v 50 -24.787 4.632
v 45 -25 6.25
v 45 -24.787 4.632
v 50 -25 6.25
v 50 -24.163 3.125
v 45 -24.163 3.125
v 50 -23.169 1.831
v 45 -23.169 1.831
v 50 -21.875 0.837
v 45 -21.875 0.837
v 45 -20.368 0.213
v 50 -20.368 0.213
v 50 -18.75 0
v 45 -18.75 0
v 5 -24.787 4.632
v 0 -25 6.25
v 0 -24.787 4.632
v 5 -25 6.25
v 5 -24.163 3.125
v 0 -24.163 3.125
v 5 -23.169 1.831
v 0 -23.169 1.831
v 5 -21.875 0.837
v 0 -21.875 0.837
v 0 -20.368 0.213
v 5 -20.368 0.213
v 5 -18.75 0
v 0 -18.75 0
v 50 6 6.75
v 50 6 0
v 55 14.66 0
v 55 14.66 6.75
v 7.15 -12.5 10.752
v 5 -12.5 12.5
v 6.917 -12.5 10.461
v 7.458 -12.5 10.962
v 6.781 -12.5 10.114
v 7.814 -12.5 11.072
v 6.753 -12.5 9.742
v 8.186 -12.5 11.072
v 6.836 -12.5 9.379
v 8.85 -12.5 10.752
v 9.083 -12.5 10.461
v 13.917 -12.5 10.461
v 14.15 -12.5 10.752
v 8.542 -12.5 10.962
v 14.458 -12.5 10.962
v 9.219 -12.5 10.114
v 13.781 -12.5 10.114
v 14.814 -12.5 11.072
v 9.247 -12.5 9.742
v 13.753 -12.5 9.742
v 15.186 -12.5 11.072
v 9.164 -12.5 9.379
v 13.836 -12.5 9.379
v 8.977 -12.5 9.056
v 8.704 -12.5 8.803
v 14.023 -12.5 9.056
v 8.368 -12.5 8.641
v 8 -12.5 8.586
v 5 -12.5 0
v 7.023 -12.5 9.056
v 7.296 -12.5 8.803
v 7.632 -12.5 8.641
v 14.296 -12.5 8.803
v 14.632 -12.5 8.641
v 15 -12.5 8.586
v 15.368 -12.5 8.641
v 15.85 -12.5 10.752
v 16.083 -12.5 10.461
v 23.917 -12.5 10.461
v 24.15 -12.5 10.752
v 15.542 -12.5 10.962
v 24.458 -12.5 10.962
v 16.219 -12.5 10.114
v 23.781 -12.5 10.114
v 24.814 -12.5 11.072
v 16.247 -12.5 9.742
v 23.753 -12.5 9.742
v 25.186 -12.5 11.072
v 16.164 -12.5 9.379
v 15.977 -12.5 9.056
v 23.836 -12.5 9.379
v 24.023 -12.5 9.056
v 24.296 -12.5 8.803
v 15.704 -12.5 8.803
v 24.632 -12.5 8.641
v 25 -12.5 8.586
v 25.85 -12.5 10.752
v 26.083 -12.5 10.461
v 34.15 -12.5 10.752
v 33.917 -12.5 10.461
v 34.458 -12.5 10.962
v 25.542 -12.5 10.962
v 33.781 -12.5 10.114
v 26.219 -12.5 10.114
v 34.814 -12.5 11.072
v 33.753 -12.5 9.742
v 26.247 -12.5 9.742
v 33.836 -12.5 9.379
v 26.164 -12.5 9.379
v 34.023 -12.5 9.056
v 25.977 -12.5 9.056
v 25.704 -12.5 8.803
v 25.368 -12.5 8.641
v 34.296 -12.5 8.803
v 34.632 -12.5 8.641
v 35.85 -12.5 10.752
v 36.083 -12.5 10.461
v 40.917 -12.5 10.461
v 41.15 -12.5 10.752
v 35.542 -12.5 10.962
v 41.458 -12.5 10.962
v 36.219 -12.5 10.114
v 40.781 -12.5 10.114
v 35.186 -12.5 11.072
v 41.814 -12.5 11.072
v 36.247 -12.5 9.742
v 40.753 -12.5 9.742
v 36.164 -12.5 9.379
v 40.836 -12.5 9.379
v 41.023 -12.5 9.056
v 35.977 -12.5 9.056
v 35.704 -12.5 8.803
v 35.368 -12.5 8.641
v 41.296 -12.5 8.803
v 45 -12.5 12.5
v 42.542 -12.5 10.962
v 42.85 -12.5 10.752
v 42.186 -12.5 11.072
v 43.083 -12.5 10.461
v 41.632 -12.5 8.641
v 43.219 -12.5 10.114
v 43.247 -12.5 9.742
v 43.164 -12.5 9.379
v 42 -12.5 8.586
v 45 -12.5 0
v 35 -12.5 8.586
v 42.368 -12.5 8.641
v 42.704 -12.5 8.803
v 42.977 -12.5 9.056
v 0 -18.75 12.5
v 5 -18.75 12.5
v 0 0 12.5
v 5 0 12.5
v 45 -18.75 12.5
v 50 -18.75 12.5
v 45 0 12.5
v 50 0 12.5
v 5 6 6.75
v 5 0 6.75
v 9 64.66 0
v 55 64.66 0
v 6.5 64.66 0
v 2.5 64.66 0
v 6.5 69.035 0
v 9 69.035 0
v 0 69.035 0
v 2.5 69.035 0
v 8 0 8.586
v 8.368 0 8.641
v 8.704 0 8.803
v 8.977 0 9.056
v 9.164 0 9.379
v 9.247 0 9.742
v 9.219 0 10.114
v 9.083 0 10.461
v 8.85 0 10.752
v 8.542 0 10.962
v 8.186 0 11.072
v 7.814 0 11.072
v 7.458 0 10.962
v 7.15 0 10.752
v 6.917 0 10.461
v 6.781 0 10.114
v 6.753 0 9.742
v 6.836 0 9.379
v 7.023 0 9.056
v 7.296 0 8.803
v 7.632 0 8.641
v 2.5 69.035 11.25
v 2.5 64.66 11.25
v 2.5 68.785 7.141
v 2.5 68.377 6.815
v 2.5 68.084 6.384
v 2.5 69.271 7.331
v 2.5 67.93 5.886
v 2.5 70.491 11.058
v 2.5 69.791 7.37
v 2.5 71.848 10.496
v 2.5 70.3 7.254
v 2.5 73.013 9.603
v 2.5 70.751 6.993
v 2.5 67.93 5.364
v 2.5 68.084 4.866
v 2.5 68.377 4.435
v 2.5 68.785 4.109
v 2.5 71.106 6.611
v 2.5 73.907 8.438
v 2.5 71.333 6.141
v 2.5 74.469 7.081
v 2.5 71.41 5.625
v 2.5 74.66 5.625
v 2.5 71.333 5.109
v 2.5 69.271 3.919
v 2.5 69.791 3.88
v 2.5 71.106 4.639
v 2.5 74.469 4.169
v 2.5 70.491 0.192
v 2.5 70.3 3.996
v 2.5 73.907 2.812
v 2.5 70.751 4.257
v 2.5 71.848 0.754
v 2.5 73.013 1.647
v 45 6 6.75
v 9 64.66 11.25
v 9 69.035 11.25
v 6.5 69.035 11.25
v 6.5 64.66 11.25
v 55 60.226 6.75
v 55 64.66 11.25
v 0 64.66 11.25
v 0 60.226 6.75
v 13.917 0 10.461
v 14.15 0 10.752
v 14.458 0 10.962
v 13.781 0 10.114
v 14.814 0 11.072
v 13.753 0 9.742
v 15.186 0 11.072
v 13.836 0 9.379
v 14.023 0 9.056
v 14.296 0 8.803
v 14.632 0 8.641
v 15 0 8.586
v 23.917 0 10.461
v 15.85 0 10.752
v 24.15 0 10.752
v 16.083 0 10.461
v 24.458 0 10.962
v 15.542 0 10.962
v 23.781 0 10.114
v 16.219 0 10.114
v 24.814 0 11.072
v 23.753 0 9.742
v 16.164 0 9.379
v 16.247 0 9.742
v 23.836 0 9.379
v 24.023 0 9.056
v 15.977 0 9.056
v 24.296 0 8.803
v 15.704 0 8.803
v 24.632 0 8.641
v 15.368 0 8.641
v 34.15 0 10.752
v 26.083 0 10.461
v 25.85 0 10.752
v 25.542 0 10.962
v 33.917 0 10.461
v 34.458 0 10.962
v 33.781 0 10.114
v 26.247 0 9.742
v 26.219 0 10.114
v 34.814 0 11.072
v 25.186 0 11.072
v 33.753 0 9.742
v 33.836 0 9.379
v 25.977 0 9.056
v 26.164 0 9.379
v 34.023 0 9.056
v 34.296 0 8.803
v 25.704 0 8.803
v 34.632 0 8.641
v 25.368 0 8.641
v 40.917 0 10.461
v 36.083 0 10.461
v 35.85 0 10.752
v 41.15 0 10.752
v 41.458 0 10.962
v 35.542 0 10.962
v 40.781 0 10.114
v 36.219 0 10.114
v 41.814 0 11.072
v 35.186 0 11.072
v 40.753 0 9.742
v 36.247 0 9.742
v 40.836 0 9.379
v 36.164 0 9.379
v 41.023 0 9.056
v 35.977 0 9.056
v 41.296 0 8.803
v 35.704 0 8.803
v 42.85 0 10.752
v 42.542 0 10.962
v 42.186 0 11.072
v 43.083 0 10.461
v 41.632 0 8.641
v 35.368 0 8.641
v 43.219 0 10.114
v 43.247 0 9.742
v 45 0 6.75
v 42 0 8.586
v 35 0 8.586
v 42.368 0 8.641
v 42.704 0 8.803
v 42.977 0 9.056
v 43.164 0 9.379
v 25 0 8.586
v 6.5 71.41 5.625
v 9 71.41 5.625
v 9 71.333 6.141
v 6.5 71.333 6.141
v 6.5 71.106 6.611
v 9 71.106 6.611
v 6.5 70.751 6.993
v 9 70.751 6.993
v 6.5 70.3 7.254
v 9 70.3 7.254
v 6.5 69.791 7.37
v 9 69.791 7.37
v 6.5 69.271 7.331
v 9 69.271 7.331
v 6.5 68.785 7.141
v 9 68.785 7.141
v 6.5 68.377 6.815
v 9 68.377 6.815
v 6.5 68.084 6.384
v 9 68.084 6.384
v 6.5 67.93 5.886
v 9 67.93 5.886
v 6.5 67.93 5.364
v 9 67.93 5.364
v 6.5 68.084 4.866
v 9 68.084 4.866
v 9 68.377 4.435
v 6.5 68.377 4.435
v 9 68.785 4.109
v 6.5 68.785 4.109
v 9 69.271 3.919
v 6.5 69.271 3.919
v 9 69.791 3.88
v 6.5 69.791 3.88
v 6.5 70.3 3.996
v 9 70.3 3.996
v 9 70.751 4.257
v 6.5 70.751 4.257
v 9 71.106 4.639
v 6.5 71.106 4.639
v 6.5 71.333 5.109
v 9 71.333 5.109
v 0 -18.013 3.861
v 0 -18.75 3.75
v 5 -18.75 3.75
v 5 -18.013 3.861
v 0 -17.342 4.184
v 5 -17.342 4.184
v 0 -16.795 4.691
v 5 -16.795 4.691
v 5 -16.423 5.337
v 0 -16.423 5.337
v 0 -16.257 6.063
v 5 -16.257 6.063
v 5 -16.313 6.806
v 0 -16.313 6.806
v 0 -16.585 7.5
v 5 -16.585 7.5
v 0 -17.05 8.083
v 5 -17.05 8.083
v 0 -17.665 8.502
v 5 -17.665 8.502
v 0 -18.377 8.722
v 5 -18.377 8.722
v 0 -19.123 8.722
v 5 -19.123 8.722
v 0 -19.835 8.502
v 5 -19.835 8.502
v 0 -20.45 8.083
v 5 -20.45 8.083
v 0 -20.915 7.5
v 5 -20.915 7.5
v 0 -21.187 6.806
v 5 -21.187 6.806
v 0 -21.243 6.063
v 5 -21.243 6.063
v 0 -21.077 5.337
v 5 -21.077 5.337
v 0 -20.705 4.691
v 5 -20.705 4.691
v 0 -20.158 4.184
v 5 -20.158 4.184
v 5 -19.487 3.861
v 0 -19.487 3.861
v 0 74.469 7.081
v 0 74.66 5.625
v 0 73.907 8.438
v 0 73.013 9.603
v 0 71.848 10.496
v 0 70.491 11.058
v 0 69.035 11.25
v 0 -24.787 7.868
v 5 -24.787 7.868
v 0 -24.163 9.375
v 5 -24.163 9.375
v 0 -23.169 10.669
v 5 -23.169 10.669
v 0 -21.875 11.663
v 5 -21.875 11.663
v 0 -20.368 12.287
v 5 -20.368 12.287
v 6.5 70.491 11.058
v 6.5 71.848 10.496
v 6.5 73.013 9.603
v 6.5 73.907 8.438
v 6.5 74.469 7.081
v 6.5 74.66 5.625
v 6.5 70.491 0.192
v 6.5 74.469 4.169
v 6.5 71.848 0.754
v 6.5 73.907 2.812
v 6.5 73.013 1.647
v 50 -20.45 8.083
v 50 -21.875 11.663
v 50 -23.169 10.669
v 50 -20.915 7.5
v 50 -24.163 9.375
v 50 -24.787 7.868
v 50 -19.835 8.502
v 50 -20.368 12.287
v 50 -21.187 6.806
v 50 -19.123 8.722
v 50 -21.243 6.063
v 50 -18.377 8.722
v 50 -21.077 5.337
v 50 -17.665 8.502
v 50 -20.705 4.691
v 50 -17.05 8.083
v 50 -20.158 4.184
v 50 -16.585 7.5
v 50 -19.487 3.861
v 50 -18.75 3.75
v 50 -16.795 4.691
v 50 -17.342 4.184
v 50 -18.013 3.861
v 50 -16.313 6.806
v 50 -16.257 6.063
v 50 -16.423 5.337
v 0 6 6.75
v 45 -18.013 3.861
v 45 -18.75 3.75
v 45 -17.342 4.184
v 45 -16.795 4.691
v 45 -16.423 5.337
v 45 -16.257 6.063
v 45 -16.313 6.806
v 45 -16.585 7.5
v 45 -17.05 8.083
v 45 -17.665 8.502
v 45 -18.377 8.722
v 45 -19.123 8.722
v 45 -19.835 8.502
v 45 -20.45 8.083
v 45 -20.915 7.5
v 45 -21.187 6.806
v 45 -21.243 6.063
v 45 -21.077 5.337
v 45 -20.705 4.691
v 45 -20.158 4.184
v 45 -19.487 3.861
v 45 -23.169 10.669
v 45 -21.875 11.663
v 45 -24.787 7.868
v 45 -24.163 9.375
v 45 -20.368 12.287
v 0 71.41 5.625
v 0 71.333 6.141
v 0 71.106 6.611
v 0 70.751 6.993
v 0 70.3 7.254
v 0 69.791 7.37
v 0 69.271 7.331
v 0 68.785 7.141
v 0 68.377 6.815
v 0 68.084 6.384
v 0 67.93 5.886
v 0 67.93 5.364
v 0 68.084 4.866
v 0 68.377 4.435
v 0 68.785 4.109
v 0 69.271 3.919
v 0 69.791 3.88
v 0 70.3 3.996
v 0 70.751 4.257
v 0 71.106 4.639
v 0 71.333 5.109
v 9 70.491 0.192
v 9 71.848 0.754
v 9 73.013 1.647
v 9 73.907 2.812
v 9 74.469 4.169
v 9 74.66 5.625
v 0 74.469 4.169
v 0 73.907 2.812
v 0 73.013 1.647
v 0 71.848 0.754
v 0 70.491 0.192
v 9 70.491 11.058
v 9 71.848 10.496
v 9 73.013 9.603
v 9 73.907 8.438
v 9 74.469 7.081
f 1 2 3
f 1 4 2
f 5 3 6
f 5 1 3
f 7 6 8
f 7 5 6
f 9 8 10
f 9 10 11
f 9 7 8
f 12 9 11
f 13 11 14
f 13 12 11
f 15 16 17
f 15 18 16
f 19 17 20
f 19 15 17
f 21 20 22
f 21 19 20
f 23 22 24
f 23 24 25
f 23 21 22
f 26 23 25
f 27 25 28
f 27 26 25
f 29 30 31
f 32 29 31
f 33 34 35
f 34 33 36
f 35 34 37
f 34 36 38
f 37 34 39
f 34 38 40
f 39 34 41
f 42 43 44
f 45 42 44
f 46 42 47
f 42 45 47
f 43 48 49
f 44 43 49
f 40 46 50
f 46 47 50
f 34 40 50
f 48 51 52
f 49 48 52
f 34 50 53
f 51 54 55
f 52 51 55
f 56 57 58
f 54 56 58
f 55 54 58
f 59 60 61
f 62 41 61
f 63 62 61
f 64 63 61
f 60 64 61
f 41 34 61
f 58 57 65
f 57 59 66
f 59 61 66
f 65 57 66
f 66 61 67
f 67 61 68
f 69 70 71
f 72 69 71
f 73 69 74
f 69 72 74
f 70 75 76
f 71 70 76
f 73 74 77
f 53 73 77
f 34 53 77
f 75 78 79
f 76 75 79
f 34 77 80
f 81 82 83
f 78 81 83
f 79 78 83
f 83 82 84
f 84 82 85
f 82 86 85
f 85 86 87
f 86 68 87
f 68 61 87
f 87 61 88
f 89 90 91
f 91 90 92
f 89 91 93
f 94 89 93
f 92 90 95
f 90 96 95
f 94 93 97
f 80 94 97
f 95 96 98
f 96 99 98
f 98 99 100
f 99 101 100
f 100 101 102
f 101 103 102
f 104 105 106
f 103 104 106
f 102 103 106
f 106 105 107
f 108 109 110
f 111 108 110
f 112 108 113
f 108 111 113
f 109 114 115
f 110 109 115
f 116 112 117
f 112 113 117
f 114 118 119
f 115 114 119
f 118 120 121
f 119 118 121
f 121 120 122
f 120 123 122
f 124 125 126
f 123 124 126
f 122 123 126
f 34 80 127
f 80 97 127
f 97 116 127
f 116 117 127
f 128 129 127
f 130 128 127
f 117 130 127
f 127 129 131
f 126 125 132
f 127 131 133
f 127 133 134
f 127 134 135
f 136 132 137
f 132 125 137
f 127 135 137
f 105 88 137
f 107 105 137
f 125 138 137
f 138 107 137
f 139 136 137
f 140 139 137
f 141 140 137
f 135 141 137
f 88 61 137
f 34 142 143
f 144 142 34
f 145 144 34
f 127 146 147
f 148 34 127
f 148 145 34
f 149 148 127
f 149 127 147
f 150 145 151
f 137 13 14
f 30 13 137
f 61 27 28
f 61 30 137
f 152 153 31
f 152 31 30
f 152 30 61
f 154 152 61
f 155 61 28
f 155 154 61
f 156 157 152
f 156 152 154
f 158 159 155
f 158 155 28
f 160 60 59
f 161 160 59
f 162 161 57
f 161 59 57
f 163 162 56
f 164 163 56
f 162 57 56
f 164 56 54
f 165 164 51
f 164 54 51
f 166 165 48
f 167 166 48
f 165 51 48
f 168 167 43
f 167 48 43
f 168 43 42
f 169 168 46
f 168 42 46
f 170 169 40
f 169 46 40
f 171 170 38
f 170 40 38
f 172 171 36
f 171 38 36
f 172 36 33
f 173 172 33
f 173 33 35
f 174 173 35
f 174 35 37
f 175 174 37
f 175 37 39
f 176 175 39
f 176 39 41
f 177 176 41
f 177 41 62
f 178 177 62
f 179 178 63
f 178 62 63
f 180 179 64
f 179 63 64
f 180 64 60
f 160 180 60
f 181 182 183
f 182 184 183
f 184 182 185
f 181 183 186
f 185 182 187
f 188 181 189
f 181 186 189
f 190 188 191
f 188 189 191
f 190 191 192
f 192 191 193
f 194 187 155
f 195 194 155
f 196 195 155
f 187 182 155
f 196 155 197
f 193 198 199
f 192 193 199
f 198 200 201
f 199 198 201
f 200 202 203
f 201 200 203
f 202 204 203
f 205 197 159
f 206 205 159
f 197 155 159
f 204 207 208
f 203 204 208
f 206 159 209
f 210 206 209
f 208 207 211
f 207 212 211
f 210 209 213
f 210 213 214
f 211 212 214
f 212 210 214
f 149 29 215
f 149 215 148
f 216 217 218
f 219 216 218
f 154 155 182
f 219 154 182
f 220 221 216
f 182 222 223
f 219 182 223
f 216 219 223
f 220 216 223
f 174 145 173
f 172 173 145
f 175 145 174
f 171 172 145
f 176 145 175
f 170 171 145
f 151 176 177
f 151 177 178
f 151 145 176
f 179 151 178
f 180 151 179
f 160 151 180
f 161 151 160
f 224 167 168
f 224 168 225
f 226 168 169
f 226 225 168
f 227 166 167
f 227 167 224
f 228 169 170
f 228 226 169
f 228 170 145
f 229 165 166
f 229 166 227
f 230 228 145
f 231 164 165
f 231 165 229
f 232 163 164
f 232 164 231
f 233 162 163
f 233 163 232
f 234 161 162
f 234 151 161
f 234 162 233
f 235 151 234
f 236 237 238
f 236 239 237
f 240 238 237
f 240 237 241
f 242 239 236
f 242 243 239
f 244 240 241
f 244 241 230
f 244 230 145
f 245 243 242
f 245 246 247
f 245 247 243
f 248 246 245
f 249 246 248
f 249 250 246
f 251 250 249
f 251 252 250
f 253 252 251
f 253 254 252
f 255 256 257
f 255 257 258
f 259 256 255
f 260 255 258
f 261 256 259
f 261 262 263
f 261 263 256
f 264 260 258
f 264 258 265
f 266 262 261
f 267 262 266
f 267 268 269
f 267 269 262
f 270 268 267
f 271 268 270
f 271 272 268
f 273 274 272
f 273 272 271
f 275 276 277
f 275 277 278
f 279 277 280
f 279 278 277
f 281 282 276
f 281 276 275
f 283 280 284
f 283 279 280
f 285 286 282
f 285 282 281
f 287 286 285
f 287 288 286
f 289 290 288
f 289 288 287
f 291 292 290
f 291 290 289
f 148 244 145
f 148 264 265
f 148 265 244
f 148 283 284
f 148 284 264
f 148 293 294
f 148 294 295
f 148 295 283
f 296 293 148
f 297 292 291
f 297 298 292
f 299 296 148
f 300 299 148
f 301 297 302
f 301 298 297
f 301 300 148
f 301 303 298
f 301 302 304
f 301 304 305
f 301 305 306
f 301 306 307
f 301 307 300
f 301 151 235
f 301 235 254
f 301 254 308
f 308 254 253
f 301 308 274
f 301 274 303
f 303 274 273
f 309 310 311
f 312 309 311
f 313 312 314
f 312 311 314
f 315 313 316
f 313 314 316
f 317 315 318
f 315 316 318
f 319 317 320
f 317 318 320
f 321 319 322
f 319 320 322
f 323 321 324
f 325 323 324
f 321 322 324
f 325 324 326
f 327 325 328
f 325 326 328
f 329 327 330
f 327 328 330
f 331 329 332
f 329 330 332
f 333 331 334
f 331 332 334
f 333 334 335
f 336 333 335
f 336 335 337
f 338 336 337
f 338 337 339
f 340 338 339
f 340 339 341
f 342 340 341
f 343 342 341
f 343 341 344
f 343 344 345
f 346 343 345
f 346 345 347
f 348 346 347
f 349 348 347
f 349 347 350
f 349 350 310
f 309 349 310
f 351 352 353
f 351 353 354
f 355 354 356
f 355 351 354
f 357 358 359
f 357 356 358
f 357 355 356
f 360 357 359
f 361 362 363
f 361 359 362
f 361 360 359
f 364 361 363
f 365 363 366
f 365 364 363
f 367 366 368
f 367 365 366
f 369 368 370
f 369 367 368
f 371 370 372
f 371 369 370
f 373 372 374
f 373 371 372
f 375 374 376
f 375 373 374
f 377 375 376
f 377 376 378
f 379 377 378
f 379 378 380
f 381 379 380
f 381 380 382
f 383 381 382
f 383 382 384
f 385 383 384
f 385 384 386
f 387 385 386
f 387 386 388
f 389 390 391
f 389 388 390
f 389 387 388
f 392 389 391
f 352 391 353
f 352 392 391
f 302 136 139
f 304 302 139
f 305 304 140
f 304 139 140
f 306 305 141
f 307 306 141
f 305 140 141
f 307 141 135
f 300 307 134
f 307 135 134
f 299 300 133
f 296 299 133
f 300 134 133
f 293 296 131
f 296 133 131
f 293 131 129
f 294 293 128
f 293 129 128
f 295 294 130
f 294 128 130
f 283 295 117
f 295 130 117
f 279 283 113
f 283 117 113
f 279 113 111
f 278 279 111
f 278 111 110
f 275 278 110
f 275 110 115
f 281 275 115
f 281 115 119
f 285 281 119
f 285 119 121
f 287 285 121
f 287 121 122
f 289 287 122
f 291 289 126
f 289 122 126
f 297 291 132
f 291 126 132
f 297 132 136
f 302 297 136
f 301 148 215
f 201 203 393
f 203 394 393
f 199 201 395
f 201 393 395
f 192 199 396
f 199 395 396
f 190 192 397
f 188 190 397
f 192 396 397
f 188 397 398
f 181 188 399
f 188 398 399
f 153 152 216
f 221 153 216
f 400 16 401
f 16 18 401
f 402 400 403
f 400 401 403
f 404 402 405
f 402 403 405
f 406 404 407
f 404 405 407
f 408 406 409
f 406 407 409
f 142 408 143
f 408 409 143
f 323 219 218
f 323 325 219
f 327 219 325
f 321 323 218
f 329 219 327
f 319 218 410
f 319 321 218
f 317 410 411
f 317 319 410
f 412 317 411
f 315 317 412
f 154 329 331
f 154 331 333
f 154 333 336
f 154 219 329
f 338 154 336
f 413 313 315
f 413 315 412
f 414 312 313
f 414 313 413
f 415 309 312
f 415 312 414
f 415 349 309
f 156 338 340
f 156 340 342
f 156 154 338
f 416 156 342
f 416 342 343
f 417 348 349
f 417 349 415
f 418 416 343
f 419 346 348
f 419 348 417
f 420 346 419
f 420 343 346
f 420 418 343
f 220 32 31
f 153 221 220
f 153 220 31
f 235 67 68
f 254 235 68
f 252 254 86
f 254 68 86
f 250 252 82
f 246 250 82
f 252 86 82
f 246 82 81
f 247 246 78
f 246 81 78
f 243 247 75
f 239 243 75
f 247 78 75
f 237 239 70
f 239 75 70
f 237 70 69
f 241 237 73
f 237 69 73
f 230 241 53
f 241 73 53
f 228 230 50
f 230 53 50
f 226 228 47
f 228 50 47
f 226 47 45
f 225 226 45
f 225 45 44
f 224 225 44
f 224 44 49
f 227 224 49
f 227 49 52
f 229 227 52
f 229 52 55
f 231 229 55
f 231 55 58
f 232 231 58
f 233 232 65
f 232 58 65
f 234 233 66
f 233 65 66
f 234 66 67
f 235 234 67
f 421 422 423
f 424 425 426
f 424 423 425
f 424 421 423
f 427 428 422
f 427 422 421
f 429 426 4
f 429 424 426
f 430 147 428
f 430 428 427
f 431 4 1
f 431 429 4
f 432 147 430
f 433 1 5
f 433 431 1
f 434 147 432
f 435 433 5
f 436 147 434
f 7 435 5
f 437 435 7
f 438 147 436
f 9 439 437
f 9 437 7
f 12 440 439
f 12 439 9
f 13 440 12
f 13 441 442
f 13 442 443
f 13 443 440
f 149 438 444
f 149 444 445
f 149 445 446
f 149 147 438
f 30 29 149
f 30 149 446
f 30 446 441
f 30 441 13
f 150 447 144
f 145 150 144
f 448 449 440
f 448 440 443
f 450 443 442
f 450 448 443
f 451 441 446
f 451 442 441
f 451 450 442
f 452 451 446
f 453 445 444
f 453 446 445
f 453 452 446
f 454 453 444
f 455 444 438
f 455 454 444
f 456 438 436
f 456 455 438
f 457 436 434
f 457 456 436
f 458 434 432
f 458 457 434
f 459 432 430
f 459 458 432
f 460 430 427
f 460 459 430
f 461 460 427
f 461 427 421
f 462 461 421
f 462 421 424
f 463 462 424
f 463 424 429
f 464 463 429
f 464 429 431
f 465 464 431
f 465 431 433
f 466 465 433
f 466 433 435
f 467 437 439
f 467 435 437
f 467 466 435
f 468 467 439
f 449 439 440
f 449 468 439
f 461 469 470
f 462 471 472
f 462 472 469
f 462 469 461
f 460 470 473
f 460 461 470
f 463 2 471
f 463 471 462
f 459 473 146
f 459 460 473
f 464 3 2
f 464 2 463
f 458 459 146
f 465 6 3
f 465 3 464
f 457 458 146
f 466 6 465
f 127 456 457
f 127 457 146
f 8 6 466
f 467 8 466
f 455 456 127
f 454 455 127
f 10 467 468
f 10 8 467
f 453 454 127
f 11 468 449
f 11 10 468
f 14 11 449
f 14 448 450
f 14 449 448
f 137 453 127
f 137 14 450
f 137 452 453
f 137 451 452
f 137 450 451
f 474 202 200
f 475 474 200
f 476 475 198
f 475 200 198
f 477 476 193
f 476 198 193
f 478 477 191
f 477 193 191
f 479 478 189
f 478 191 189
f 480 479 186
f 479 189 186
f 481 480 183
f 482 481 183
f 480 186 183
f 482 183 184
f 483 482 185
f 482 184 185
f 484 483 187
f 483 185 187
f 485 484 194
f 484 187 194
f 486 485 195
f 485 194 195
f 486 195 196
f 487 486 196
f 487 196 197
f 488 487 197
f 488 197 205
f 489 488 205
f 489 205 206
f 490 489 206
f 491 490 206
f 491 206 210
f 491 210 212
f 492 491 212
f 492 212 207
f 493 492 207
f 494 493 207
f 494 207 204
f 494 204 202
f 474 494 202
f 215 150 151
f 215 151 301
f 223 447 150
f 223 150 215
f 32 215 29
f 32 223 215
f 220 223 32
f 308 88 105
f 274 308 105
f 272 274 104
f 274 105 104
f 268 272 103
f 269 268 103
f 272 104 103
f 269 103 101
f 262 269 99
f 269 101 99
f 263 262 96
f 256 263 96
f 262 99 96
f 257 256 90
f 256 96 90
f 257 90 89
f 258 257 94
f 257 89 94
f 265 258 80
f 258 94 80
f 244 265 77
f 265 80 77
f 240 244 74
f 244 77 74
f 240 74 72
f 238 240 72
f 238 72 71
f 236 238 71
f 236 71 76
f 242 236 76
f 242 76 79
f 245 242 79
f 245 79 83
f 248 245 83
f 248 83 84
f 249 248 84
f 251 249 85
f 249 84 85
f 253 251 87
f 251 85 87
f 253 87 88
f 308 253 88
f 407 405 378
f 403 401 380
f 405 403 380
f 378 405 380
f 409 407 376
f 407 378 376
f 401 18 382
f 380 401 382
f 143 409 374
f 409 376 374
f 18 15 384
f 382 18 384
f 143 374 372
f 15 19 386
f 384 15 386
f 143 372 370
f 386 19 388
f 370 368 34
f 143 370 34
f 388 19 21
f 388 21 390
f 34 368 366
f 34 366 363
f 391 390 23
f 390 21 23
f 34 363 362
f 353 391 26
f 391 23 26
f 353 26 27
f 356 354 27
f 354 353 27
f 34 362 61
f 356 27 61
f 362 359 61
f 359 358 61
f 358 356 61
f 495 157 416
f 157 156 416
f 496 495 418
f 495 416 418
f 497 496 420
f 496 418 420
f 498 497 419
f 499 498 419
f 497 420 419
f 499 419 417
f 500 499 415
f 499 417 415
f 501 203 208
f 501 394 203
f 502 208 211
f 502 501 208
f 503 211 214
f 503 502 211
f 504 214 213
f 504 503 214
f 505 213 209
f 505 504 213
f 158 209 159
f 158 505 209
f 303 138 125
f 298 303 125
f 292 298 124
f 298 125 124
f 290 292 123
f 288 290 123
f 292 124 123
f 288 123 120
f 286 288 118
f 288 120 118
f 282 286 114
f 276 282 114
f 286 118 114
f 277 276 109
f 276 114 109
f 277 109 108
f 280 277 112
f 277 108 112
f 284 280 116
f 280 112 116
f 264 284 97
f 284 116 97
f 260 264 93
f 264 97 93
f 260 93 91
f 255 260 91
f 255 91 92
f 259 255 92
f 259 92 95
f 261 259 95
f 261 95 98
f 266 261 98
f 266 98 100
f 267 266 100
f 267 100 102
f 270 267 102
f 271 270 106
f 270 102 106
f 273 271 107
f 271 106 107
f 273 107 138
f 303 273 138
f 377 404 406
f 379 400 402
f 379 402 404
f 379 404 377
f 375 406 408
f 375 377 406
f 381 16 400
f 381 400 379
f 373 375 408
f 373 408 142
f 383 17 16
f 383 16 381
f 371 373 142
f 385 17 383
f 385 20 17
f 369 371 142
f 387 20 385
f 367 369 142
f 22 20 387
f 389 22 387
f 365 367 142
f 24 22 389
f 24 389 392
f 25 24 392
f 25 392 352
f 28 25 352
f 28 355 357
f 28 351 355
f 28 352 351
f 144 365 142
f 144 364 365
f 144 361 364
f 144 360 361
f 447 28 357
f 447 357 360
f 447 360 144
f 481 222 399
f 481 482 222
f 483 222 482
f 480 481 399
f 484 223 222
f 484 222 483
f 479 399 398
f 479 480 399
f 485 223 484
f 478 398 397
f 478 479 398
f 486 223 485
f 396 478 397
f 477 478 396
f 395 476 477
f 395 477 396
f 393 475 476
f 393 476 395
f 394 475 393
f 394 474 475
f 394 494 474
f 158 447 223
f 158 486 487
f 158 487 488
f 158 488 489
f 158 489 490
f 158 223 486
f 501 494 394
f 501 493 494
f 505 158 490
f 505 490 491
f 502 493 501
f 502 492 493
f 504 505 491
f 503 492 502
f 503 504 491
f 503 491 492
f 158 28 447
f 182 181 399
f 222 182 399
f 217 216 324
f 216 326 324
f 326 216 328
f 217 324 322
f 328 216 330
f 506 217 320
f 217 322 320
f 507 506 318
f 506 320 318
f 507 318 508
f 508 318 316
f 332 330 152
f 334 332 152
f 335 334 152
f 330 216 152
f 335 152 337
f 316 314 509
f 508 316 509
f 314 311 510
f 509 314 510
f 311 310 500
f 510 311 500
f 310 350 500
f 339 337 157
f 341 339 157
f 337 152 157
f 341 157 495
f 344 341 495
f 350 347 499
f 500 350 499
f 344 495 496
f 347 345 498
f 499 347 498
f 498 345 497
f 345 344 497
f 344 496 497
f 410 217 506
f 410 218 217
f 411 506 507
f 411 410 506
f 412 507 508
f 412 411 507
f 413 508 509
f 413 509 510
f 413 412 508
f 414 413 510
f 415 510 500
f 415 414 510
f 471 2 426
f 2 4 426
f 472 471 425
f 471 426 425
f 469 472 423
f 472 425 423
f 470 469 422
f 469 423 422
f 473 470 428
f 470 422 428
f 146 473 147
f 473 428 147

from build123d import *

# Parameters (mm, degrees)
SKETCH1_W               = 50
SKETCH1_H               = 12.5
SKETCH1_W_2             = 5
BOSS_EXTRUDE1_DEPTH     = 12.5
FILLET1_R               = 6.25
CUT_EXTRUDE1_DEPTH      = 77.5
CUT_EXTRUDE1_DEPTH_BACK = 24.5
SKETCH2_R               = 2.5
SKETCH4_R               = 1.25
CUT_EXTRUDE2_DEPTH      = 12.5
BOSS_EXTRUDE4_DEPTH     = 6
BOSS_EXTRUDE5_DEPTH     = 5
BOSS_EXTRUDE6_DEPTH     = 5
BOSS_EXTRUDE8_DEPTH     = 6.75
BOSS_EXTRUDE10_DEPTH    = 55
SKETCH12_W              = 2.5
SKETCH12_H              = 10
BOSS_EXTRUDE11_DEPTH    = 11.25
SKETCH14_W              = 2.5
SKETCH14_H              = 10
BOSS_EXTRUDE12_DEPTH    = 11.25
FILLET2_R               = 5.625
SKETCH16_R              = 1.75
CUT_EXTRUDE3_DEPTH      = 18.25


with BuildPart() as part:
    # Sketch1 → Boss-Extrude1 (new body)
    with BuildSketch(Plane.XY):
        with Locations((25, -6.25)):
            Rectangle(SKETCH1_W, SKETCH1_H)
        with Locations((2.5, -18.75)):
            Rectangle(SKETCH1_W_2, SKETCH1_H)
        with Locations((47.5, -18.75)):
            Rectangle(SKETCH1_W_2, SKETCH1_H)
    extrude(amount=BOSS_EXTRUDE1_DEPTH)

    # Fillet1
    fillet1_edges = [part.edges().sort_by_distance(p)[0] for p in [
        (2.5, -25, 12.5),
        (2.5, -25, 0),
        (47.5, -25, 12.5),
        (47.5, -25, 0),
    ]]
    fillet(fillet1_edges, radius=FILLET1_R - 0.0001)  # a hair under: the kernel refuses the full size

    # Sketch2 → Cut-Extrude1 (cut, two sides: drawn at the far end of the back side and taken through both)
    with BuildSketch(Plane(origin=(5, 0, 0), x_dir=(0, 0, -1), z_dir=(1, 0, 0)).offset(-CUT_EXTRUDE1_DEPTH_BACK)):
        with Locations((-6.25, -18.75)):
            Circle(SKETCH2_R)
    extrude(amount=CUT_EXTRUDE1_DEPTH + CUT_EXTRUDE1_DEPTH_BACK, mode=Mode.SUBTRACT)

    # Sketch4 → Cut-Extrude2 (cut)
    with BuildSketch(Plane(origin=(0, -12.5, 0), x_dir=(-1, 0, 0), z_dir=(0, -1, 0))):
        with Locations(Location((-8, -9.835613506, 0), (0, 0, 90))):
            Circle(SKETCH4_R)
        with Locations(Location((-15, -9.835613506, 0), (0, 0, 90))):
            Circle(SKETCH4_R)
        with Locations(Location((-25, -9.835613506, 0), (0, 0, 90))):
            Circle(SKETCH4_R)
        with Locations(Location((-35, -9.835613506, 0), (0, 0, 90))):
            Circle(SKETCH4_R)
        with Locations(Location((-42, -9.835613506, 0), (0, 0, 90))):
            Circle(SKETCH4_R)
    extrude(amount=-CUT_EXTRUDE2_DEPTH, mode=Mode.SUBTRACT)

    # Sketch5 → Boss-Extrude4 (add)
    with BuildSketch(Plane(origin=(0, 0, 0), x_dir=(1, 0, 0), z_dir=(0, 1, 0))):
        Polygon((50, 0), (0, 0), (0, -6.75), (5.75, -6.75), (44.25, -6.75), (50, -6.75), align=None)
    extrude(amount=BOSS_EXTRUDE4_DEPTH)

    # Sketch6 → Boss-Extrude5 (add)
    with BuildSketch(Plane.ZY):
        Polygon((6.75, 6), (12.5, 0), (6.75, 0), align=None)
    extrude(amount=-BOSS_EXTRUDE5_DEPTH)

    # Sketch7 → Boss-Extrude6 (add)
    with BuildSketch(Plane(origin=(50, 0, 0), x_dir=(0, 0, -1), z_dir=(1, 0, 0))):
        Polygon((-6.75, 6), (-12.5, 0), (-6.75, 0), align=None)
    extrude(amount=-BOSS_EXTRUDE6_DEPTH)

    # Sketch8 → Boss-Extrude8 (add)
    with BuildSketch(Plane(origin=(0, 0, 0), x_dir=(-1, 0, 0), z_dir=(0, 0, -1))):
        Polygon((-50, 6), (-55, 14.660254038), (-55, 64.660254038), (0, 64.660254038), (0, 6), align=None)
    extrude(amount=-BOSS_EXTRUDE8_DEPTH)

    # Sketch10 → Boss-Extrude10 (add)
    with BuildSketch(Plane.ZY):
        Polygon((6.75, 64.660254038), (11.25, 64.660254038), (6.75, 60.225702909), align=None)
    extrude(amount=-BOSS_EXTRUDE10_DEPTH)

    # Sketch12 → Boss-Extrude11 (add)
    with BuildSketch(Plane(origin=(0, 0, 0), x_dir=(-1, 0, 0), z_dir=(0, 0, -1))):
        with Locations((-1.25, 69.660254038)):
            Rectangle(SKETCH12_W, SKETCH12_H)
    extrude(amount=-BOSS_EXTRUDE11_DEPTH)

    # Sketch14 → Boss-Extrude12 (add)
    with BuildSketch(Plane(origin=(0, 0, 0), x_dir=(-1, 0, 0), z_dir=(0, 0, -1))):
        with Locations((-7.75, 69.660254038)):
            Rectangle(SKETCH14_W, SKETCH14_H)
    extrude(amount=-BOSS_EXTRUDE12_DEPTH)

    # Fillet2
    fillet2_edges = [part.edges().sort_by_distance(p)[0] for p in [
        (7.75, 74.660254038, 0),
        (7.75, 74.660254038, 11.25),
        (1.25, 74.660254038, 11.25),
        (1.25, 74.660254038, 0),
    ]]
    fillet(fillet2_edges, radius=FILLET2_R - 0.0001)  # a hair under: the kernel refuses the full size

    # Sketch16 → Cut-Extrude3 (cut)
    with BuildSketch(Plane(origin=(9, 0, 0), x_dir=(0, 0, -1), z_dir=(1, 0, 0))):
        with Locations(Location((-5.625, 69.660254038, 0), (0, 0, 90))):
            Circle(SKETCH16_R)
    extrude(amount=-CUT_EXTRUDE3_DEPTH, mode=Mode.SUBTRACT)


solid = part.part
